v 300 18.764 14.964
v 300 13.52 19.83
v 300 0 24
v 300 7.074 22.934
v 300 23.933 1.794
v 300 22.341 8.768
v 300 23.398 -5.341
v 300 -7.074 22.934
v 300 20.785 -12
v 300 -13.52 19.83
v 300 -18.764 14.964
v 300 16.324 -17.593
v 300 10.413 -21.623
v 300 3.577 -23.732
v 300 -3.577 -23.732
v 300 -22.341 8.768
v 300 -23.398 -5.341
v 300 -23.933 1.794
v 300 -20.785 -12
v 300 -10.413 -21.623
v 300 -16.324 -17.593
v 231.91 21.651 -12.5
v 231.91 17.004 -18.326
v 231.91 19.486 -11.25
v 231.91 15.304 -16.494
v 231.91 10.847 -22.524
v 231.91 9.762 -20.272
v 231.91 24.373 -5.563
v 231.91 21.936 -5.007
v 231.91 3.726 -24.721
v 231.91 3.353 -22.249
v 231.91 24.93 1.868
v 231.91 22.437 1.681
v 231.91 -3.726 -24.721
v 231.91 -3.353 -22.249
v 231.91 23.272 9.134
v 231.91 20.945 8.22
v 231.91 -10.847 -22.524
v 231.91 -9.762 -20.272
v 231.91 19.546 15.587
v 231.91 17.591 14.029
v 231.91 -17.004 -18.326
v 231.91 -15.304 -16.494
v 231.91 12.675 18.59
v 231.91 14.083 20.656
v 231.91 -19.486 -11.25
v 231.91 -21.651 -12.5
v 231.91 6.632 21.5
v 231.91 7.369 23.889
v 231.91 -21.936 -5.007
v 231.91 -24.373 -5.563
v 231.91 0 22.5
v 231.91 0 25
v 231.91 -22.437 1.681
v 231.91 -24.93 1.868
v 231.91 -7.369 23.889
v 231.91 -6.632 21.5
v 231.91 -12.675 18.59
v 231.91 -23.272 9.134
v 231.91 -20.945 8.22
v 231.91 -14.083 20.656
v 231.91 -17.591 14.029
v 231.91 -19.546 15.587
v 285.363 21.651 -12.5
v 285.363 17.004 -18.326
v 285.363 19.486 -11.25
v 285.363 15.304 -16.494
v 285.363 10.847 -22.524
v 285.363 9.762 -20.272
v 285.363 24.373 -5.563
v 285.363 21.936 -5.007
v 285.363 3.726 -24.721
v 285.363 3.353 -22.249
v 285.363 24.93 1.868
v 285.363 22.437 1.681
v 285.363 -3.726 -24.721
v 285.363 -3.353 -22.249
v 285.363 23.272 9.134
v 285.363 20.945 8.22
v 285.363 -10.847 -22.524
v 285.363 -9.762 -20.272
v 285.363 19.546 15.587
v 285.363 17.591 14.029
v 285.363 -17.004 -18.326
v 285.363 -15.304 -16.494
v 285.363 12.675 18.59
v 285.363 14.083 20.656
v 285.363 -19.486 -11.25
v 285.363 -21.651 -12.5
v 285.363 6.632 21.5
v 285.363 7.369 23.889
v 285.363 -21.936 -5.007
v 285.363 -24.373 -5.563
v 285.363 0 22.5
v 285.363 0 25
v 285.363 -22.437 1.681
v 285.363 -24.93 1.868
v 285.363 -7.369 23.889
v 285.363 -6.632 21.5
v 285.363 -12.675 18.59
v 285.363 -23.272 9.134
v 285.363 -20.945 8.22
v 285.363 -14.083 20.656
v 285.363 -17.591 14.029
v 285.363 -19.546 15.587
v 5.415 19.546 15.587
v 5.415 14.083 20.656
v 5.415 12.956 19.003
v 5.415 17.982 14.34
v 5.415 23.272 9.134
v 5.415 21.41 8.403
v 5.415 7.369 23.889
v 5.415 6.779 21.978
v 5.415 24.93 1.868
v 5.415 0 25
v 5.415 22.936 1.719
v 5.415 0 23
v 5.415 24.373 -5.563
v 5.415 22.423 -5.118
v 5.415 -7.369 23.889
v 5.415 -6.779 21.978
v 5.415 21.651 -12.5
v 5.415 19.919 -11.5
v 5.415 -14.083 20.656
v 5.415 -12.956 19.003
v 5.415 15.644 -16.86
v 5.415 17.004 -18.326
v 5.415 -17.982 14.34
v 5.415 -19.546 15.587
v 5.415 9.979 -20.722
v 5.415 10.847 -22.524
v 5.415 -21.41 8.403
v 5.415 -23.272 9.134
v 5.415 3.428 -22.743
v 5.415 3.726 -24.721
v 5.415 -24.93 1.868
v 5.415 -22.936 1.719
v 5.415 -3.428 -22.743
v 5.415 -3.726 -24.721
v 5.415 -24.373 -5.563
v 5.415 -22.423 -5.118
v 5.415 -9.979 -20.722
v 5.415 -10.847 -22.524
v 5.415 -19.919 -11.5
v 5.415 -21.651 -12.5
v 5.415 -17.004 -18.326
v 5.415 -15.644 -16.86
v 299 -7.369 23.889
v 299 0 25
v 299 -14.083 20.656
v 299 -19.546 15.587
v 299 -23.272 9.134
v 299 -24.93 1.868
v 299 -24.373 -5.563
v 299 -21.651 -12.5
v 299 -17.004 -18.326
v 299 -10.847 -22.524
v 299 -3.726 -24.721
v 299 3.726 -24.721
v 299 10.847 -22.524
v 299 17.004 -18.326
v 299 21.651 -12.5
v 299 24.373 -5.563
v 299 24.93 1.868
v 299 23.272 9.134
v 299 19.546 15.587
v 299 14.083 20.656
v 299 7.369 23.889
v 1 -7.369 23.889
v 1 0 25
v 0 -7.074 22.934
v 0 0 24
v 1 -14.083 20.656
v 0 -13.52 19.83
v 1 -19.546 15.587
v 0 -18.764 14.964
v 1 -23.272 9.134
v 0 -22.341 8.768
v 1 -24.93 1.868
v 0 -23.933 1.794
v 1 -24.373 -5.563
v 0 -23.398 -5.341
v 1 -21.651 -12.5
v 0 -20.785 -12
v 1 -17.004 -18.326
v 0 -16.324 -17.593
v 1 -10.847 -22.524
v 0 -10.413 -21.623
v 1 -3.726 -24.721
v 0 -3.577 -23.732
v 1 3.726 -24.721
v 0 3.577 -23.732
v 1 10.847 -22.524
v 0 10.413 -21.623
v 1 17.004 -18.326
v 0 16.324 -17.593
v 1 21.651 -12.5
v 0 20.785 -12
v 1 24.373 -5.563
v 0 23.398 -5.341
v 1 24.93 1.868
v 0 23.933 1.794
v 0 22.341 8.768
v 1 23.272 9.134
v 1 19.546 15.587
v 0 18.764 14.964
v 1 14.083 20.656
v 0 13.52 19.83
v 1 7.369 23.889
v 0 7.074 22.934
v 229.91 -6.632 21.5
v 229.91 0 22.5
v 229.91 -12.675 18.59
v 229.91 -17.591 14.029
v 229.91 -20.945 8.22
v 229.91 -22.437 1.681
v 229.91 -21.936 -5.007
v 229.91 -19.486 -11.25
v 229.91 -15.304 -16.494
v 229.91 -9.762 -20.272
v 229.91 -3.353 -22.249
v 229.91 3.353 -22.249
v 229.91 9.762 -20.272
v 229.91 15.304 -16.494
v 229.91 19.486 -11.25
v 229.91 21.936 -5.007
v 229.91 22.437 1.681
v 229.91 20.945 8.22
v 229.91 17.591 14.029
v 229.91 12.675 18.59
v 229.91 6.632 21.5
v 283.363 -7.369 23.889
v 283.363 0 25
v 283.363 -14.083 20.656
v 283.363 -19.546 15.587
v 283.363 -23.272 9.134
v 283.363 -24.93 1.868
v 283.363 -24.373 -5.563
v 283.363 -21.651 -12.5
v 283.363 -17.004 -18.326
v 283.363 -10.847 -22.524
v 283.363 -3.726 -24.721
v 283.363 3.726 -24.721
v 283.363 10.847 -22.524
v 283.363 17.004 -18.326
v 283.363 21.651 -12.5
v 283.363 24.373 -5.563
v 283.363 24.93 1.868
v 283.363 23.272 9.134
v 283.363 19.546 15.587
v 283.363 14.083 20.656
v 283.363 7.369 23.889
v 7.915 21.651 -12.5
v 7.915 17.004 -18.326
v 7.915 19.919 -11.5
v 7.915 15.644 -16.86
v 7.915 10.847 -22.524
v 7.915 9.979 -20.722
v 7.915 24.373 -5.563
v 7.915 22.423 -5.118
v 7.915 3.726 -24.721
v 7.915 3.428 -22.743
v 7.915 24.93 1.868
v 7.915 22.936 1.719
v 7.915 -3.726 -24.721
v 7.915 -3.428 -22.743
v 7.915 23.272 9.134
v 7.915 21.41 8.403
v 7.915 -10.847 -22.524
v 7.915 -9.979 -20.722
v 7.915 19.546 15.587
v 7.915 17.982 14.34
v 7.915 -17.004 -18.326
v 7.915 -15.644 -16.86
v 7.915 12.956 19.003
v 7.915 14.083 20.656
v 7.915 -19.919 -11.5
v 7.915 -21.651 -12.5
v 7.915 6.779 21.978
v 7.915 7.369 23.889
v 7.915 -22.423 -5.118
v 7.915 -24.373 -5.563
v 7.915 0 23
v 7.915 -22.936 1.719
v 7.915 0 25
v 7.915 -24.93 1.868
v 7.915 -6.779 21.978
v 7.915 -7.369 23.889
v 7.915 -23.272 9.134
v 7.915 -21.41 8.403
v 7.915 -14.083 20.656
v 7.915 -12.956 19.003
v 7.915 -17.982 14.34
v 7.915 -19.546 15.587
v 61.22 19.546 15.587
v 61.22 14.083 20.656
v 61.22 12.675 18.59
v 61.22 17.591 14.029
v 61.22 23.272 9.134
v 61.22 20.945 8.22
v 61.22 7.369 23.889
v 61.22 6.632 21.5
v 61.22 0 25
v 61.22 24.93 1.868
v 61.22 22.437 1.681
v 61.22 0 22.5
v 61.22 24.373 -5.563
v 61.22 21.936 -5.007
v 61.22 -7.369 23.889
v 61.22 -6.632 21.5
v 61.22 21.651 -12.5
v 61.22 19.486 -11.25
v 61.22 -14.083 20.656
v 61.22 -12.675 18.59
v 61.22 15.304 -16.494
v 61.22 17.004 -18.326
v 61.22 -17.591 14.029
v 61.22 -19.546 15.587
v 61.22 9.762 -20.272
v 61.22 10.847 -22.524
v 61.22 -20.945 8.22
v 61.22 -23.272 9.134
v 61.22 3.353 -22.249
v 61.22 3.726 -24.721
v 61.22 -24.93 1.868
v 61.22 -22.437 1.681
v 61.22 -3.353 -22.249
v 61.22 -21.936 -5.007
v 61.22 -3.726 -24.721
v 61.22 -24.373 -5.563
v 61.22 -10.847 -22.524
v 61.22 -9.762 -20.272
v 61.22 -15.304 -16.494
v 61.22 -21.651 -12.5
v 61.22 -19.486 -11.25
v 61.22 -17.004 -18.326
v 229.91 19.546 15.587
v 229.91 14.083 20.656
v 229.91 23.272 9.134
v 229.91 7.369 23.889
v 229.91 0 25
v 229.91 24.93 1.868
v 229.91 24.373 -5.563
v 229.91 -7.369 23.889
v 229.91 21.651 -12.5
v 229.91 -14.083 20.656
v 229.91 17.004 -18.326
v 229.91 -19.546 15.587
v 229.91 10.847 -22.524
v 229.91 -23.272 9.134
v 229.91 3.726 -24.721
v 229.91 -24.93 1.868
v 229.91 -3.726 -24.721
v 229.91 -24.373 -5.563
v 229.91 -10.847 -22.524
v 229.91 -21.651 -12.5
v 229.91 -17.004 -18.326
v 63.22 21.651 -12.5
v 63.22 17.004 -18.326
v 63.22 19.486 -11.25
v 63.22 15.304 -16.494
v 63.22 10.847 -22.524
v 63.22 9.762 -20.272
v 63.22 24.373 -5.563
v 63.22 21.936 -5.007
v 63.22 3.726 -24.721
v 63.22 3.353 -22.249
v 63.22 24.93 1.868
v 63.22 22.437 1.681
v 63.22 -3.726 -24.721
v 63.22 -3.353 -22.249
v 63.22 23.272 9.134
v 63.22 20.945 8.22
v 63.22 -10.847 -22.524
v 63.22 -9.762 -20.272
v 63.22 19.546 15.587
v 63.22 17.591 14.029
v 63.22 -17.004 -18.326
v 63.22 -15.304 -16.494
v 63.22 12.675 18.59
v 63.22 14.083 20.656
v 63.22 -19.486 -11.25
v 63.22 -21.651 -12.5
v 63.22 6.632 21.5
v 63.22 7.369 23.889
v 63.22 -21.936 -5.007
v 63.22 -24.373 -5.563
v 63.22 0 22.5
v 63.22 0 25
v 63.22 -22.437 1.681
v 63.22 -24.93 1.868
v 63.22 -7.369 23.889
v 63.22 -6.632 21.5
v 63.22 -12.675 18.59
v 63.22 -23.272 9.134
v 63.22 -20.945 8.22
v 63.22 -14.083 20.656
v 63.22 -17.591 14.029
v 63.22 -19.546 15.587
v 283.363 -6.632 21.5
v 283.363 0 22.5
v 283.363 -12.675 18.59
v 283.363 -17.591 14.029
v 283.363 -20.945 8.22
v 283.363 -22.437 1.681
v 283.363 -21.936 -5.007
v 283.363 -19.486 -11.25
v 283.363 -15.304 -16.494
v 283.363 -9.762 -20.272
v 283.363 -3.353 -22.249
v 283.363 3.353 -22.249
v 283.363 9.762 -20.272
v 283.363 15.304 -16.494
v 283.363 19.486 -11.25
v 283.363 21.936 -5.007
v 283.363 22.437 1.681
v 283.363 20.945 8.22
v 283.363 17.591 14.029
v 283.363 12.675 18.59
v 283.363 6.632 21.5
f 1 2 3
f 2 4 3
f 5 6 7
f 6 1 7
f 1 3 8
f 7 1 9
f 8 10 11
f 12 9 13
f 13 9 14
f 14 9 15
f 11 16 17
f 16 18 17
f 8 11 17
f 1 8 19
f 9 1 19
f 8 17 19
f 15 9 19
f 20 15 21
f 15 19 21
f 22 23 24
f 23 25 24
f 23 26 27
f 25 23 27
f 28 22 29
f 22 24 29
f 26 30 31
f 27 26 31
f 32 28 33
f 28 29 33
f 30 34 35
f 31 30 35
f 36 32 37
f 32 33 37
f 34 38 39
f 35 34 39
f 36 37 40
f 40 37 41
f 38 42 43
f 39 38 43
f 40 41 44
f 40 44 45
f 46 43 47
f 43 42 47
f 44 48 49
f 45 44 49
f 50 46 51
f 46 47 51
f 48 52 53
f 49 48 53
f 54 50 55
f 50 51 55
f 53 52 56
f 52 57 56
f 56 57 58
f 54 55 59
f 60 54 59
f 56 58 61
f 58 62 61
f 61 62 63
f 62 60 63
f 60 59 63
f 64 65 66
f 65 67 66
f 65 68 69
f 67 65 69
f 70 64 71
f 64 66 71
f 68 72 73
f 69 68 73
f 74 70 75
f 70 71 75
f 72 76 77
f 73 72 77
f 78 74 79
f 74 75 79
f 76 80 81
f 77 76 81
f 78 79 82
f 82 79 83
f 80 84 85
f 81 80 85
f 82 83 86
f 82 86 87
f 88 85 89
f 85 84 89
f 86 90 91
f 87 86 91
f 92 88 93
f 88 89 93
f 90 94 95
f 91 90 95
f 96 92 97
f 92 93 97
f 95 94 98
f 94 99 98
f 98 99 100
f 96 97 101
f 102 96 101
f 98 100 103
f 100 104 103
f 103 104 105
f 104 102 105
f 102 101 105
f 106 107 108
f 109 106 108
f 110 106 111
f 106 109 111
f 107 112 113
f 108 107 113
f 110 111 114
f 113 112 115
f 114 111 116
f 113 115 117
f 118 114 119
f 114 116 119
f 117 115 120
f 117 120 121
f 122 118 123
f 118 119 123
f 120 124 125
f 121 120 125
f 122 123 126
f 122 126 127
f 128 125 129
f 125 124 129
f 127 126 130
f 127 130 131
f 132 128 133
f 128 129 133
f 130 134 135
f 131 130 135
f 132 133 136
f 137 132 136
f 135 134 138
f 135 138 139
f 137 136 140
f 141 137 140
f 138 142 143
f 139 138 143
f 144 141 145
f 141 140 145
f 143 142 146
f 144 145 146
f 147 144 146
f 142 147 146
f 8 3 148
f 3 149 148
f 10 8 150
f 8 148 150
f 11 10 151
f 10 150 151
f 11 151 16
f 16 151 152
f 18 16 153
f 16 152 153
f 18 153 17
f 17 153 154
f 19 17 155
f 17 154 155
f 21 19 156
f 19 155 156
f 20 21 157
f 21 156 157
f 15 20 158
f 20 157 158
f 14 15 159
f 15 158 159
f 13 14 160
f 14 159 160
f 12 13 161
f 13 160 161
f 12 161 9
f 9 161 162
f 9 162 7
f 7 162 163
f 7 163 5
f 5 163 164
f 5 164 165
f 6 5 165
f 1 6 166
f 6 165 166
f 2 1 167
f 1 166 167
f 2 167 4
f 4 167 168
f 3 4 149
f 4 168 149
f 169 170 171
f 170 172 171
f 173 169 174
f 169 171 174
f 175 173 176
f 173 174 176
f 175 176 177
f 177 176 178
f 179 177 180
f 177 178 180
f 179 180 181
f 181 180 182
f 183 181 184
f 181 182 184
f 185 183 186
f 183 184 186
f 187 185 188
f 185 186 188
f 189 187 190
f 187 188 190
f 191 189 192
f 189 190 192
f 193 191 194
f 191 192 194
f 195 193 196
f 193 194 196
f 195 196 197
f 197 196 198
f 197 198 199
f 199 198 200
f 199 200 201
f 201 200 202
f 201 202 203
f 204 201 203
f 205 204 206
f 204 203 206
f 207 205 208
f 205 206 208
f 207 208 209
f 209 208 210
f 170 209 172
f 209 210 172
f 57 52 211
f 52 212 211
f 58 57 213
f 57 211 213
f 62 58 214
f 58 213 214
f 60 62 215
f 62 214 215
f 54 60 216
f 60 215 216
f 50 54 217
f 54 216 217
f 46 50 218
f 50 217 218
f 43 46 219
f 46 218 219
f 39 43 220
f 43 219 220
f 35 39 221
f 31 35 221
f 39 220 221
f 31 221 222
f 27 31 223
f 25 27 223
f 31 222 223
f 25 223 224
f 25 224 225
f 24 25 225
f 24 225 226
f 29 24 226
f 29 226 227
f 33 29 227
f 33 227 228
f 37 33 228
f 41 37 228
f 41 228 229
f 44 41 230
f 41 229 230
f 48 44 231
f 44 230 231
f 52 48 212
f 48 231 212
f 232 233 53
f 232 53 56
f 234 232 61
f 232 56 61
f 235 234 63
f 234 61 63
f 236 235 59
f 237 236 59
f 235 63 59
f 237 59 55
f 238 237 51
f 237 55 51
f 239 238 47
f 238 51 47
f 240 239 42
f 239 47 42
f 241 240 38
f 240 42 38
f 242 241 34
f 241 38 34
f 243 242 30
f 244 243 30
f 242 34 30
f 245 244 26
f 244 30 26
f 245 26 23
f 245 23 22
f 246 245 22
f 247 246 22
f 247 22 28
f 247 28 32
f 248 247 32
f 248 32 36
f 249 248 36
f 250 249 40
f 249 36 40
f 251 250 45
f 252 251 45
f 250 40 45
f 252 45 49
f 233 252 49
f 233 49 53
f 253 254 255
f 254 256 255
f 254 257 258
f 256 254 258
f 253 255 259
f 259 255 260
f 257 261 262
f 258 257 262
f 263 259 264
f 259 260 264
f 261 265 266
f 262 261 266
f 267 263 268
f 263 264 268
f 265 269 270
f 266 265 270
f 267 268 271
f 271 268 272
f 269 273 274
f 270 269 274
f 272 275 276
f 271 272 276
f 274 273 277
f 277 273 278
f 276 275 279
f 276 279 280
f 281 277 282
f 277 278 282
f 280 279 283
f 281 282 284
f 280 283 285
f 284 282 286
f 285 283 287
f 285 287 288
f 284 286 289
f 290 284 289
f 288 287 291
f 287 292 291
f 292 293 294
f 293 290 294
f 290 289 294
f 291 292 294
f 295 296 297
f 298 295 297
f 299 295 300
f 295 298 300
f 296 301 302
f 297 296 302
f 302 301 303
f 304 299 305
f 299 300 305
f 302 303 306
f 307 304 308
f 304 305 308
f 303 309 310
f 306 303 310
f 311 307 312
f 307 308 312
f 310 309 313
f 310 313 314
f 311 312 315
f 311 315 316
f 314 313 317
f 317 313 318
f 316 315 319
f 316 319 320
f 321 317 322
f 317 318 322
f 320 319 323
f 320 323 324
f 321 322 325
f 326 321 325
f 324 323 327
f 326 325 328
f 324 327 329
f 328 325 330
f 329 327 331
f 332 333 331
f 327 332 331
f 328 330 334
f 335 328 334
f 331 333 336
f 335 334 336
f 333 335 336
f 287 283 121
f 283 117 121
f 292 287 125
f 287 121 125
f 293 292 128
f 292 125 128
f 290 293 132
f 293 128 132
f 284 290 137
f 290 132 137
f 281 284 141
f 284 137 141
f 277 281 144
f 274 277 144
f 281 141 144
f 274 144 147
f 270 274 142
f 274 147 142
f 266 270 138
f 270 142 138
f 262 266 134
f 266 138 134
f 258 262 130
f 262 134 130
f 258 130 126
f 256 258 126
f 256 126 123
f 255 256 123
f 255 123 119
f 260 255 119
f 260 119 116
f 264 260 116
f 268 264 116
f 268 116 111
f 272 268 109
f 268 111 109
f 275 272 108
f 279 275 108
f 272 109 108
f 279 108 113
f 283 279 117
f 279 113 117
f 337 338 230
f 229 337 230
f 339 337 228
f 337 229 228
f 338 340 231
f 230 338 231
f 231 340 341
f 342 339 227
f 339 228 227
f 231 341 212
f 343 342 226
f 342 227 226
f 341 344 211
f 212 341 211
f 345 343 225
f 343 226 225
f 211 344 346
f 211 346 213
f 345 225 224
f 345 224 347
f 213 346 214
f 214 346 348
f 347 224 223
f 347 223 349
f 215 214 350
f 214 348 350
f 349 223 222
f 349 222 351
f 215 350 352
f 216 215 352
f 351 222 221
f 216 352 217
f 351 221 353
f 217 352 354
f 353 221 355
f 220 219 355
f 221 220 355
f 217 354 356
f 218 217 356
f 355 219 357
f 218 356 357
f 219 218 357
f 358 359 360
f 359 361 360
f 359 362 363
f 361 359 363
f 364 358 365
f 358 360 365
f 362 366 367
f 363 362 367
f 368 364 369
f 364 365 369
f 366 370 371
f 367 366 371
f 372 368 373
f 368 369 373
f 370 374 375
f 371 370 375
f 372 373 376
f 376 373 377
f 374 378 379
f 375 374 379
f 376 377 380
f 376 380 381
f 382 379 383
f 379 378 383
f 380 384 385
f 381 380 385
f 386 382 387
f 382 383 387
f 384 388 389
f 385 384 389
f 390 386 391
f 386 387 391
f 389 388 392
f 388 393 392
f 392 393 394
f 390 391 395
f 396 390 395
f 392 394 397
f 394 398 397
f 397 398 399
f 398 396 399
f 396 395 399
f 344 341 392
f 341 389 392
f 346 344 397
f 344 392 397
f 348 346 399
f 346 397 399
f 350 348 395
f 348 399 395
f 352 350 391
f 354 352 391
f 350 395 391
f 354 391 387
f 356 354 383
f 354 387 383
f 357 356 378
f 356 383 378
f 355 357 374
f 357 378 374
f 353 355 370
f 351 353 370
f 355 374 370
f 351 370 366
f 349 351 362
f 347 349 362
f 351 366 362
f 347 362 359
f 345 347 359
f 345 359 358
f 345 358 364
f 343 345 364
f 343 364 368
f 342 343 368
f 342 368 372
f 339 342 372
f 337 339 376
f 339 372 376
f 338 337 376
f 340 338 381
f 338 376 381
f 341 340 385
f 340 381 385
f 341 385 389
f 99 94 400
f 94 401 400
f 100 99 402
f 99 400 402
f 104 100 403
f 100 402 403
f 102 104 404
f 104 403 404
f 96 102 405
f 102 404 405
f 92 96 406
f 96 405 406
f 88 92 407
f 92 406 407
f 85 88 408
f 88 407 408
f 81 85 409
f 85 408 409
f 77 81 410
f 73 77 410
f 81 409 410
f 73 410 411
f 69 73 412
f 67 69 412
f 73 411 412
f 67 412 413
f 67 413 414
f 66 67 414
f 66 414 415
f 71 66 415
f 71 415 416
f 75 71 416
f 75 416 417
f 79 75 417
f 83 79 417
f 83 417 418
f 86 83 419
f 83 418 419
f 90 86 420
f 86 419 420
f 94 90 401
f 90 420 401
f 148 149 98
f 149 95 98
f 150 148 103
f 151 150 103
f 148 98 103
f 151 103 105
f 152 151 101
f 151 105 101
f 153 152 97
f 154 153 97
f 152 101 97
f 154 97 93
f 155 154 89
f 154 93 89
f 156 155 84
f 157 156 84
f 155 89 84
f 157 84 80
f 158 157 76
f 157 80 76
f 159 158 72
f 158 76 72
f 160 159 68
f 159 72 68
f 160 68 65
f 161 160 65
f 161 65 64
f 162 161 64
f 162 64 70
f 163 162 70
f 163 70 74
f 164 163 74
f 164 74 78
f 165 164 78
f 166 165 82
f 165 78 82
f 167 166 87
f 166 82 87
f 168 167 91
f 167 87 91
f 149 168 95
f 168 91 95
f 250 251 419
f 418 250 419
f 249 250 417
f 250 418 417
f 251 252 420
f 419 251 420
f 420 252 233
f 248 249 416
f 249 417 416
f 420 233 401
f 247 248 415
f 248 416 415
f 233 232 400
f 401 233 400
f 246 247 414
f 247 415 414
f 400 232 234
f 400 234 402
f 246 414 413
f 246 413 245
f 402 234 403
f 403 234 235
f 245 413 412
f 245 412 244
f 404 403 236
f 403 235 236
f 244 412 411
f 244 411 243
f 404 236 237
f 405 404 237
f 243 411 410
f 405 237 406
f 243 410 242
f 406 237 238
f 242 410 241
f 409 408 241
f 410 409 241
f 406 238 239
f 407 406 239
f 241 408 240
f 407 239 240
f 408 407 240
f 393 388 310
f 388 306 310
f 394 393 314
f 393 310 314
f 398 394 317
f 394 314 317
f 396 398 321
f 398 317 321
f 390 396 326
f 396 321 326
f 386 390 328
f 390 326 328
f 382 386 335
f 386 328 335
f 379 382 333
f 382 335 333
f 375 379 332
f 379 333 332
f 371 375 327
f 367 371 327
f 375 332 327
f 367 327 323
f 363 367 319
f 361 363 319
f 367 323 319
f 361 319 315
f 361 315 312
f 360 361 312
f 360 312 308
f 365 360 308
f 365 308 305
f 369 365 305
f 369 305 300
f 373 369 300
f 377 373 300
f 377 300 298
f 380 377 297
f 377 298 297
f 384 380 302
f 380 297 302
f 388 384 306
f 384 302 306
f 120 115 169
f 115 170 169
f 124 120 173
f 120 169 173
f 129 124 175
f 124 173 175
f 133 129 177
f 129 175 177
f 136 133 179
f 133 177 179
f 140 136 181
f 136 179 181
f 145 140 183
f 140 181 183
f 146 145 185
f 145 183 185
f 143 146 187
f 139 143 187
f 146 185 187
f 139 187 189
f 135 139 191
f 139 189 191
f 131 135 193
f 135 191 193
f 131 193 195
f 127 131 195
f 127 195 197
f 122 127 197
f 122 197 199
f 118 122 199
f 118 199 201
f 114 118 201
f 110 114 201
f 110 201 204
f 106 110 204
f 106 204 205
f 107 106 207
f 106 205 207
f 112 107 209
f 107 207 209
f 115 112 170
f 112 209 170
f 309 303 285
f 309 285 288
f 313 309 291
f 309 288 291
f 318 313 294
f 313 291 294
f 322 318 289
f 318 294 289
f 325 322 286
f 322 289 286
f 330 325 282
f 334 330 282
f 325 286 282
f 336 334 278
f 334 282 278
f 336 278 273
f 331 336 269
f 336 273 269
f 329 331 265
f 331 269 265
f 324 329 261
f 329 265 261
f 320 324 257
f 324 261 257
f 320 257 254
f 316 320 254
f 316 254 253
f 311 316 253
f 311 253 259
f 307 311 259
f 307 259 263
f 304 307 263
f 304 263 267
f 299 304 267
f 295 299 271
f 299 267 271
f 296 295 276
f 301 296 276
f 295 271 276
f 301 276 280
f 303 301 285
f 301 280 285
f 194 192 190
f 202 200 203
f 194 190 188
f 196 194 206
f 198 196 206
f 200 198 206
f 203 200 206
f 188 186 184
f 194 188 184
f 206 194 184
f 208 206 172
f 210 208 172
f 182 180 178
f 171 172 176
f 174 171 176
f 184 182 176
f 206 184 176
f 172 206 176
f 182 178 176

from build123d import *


with BuildPart() as part:
    # Esboço1 → Revolução1 (revolve)
    with BuildSketch(Plane.XY, mode=Mode.PRIVATE) as revolu_o1_sk:
        Polygon((0, 0), (300, 0), (300, 24), (299, 25), (285.363331024, 25), (285.363331024, 22.5), (283.363331024, 22.5), (283.363331024, 25), (231.910129711, 25), (231.910129711, 22.5), (229.910129711, 22.5), (229.910129711, 25), (220, 25), (63.219900676, 25), (63.219900676, 22.5), (61.219900676, 22.5), (61.219900676, 25), (7.914643103, 25), (7.914643103, 23), (5.414643103, 23), (5.414643103, 25), (1, 25), (0, 24), align=None)
    revolve(revolu_o1_sk.sketch.rotate(Axis((0, 0, 0), (1, 0, 0)), 90), axis=Axis((0, 0, 0), (1, 0, 0)))


solid = part.part
